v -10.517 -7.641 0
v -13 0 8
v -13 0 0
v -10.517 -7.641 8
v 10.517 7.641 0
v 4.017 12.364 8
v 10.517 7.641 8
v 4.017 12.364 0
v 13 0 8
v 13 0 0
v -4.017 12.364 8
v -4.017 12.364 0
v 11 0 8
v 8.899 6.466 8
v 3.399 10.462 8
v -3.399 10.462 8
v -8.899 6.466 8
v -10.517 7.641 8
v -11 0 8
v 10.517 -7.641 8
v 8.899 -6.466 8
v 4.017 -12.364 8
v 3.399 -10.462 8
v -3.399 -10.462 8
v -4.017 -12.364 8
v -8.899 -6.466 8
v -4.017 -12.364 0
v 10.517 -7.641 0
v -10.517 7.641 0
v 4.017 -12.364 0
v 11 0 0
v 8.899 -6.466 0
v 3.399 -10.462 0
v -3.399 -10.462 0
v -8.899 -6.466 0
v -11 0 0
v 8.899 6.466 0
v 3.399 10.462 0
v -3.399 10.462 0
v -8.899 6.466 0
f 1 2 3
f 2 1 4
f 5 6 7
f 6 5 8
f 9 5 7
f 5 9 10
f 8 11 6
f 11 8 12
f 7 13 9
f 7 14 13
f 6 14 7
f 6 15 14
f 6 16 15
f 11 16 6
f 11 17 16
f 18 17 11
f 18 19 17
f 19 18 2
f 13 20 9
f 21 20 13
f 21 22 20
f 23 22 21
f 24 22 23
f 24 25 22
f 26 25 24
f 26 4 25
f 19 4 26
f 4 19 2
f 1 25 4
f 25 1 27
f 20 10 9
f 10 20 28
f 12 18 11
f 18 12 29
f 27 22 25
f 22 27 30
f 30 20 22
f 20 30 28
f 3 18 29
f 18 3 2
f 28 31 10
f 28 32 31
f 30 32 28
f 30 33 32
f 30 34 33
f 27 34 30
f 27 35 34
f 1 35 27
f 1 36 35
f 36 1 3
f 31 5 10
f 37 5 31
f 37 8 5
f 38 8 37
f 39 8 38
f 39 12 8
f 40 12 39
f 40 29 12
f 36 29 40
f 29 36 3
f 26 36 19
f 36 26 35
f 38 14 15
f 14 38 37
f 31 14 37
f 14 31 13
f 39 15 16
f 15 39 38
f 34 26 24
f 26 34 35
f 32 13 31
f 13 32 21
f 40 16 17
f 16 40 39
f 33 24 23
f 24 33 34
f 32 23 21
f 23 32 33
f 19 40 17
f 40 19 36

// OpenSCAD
$fn=10;
r = 10;
resolution = 50;

function perimeter(radius) = radius*2*pi();
function pi()=3.14159265358979323846;
function trans(i) = [cos(i)*r,sin(i)*r];
function angle(i) = 360/perimeter(r)*i;

module dxf() {
    resize([50,6])import("dxf.dxf",origin =[-208,-60]);
}

module waveSplit(x,y=resolution) {
    translate([-x*50/y,0])intersection() {
        translate([x*50/y,0])square([400/y,6]);
        dxf();
    }
}

module waveExtrusion() {
    for(i=[0:resolution]) {
        a = angle(i);
        translate(trans(a))rotate(a=[0,0,a])rotate(a=[90,0,90])
                linear_extrude(height=3.5)waveSplit(x=i);                   
    }
}    

module ring() {
    difference() {
        cylinder(r=r+3,h=8);
        cylinder(r=r+1,h=8);
    }
}

difference() {
    ring();
    translate([0,0,1])waveExtrusion();
}
